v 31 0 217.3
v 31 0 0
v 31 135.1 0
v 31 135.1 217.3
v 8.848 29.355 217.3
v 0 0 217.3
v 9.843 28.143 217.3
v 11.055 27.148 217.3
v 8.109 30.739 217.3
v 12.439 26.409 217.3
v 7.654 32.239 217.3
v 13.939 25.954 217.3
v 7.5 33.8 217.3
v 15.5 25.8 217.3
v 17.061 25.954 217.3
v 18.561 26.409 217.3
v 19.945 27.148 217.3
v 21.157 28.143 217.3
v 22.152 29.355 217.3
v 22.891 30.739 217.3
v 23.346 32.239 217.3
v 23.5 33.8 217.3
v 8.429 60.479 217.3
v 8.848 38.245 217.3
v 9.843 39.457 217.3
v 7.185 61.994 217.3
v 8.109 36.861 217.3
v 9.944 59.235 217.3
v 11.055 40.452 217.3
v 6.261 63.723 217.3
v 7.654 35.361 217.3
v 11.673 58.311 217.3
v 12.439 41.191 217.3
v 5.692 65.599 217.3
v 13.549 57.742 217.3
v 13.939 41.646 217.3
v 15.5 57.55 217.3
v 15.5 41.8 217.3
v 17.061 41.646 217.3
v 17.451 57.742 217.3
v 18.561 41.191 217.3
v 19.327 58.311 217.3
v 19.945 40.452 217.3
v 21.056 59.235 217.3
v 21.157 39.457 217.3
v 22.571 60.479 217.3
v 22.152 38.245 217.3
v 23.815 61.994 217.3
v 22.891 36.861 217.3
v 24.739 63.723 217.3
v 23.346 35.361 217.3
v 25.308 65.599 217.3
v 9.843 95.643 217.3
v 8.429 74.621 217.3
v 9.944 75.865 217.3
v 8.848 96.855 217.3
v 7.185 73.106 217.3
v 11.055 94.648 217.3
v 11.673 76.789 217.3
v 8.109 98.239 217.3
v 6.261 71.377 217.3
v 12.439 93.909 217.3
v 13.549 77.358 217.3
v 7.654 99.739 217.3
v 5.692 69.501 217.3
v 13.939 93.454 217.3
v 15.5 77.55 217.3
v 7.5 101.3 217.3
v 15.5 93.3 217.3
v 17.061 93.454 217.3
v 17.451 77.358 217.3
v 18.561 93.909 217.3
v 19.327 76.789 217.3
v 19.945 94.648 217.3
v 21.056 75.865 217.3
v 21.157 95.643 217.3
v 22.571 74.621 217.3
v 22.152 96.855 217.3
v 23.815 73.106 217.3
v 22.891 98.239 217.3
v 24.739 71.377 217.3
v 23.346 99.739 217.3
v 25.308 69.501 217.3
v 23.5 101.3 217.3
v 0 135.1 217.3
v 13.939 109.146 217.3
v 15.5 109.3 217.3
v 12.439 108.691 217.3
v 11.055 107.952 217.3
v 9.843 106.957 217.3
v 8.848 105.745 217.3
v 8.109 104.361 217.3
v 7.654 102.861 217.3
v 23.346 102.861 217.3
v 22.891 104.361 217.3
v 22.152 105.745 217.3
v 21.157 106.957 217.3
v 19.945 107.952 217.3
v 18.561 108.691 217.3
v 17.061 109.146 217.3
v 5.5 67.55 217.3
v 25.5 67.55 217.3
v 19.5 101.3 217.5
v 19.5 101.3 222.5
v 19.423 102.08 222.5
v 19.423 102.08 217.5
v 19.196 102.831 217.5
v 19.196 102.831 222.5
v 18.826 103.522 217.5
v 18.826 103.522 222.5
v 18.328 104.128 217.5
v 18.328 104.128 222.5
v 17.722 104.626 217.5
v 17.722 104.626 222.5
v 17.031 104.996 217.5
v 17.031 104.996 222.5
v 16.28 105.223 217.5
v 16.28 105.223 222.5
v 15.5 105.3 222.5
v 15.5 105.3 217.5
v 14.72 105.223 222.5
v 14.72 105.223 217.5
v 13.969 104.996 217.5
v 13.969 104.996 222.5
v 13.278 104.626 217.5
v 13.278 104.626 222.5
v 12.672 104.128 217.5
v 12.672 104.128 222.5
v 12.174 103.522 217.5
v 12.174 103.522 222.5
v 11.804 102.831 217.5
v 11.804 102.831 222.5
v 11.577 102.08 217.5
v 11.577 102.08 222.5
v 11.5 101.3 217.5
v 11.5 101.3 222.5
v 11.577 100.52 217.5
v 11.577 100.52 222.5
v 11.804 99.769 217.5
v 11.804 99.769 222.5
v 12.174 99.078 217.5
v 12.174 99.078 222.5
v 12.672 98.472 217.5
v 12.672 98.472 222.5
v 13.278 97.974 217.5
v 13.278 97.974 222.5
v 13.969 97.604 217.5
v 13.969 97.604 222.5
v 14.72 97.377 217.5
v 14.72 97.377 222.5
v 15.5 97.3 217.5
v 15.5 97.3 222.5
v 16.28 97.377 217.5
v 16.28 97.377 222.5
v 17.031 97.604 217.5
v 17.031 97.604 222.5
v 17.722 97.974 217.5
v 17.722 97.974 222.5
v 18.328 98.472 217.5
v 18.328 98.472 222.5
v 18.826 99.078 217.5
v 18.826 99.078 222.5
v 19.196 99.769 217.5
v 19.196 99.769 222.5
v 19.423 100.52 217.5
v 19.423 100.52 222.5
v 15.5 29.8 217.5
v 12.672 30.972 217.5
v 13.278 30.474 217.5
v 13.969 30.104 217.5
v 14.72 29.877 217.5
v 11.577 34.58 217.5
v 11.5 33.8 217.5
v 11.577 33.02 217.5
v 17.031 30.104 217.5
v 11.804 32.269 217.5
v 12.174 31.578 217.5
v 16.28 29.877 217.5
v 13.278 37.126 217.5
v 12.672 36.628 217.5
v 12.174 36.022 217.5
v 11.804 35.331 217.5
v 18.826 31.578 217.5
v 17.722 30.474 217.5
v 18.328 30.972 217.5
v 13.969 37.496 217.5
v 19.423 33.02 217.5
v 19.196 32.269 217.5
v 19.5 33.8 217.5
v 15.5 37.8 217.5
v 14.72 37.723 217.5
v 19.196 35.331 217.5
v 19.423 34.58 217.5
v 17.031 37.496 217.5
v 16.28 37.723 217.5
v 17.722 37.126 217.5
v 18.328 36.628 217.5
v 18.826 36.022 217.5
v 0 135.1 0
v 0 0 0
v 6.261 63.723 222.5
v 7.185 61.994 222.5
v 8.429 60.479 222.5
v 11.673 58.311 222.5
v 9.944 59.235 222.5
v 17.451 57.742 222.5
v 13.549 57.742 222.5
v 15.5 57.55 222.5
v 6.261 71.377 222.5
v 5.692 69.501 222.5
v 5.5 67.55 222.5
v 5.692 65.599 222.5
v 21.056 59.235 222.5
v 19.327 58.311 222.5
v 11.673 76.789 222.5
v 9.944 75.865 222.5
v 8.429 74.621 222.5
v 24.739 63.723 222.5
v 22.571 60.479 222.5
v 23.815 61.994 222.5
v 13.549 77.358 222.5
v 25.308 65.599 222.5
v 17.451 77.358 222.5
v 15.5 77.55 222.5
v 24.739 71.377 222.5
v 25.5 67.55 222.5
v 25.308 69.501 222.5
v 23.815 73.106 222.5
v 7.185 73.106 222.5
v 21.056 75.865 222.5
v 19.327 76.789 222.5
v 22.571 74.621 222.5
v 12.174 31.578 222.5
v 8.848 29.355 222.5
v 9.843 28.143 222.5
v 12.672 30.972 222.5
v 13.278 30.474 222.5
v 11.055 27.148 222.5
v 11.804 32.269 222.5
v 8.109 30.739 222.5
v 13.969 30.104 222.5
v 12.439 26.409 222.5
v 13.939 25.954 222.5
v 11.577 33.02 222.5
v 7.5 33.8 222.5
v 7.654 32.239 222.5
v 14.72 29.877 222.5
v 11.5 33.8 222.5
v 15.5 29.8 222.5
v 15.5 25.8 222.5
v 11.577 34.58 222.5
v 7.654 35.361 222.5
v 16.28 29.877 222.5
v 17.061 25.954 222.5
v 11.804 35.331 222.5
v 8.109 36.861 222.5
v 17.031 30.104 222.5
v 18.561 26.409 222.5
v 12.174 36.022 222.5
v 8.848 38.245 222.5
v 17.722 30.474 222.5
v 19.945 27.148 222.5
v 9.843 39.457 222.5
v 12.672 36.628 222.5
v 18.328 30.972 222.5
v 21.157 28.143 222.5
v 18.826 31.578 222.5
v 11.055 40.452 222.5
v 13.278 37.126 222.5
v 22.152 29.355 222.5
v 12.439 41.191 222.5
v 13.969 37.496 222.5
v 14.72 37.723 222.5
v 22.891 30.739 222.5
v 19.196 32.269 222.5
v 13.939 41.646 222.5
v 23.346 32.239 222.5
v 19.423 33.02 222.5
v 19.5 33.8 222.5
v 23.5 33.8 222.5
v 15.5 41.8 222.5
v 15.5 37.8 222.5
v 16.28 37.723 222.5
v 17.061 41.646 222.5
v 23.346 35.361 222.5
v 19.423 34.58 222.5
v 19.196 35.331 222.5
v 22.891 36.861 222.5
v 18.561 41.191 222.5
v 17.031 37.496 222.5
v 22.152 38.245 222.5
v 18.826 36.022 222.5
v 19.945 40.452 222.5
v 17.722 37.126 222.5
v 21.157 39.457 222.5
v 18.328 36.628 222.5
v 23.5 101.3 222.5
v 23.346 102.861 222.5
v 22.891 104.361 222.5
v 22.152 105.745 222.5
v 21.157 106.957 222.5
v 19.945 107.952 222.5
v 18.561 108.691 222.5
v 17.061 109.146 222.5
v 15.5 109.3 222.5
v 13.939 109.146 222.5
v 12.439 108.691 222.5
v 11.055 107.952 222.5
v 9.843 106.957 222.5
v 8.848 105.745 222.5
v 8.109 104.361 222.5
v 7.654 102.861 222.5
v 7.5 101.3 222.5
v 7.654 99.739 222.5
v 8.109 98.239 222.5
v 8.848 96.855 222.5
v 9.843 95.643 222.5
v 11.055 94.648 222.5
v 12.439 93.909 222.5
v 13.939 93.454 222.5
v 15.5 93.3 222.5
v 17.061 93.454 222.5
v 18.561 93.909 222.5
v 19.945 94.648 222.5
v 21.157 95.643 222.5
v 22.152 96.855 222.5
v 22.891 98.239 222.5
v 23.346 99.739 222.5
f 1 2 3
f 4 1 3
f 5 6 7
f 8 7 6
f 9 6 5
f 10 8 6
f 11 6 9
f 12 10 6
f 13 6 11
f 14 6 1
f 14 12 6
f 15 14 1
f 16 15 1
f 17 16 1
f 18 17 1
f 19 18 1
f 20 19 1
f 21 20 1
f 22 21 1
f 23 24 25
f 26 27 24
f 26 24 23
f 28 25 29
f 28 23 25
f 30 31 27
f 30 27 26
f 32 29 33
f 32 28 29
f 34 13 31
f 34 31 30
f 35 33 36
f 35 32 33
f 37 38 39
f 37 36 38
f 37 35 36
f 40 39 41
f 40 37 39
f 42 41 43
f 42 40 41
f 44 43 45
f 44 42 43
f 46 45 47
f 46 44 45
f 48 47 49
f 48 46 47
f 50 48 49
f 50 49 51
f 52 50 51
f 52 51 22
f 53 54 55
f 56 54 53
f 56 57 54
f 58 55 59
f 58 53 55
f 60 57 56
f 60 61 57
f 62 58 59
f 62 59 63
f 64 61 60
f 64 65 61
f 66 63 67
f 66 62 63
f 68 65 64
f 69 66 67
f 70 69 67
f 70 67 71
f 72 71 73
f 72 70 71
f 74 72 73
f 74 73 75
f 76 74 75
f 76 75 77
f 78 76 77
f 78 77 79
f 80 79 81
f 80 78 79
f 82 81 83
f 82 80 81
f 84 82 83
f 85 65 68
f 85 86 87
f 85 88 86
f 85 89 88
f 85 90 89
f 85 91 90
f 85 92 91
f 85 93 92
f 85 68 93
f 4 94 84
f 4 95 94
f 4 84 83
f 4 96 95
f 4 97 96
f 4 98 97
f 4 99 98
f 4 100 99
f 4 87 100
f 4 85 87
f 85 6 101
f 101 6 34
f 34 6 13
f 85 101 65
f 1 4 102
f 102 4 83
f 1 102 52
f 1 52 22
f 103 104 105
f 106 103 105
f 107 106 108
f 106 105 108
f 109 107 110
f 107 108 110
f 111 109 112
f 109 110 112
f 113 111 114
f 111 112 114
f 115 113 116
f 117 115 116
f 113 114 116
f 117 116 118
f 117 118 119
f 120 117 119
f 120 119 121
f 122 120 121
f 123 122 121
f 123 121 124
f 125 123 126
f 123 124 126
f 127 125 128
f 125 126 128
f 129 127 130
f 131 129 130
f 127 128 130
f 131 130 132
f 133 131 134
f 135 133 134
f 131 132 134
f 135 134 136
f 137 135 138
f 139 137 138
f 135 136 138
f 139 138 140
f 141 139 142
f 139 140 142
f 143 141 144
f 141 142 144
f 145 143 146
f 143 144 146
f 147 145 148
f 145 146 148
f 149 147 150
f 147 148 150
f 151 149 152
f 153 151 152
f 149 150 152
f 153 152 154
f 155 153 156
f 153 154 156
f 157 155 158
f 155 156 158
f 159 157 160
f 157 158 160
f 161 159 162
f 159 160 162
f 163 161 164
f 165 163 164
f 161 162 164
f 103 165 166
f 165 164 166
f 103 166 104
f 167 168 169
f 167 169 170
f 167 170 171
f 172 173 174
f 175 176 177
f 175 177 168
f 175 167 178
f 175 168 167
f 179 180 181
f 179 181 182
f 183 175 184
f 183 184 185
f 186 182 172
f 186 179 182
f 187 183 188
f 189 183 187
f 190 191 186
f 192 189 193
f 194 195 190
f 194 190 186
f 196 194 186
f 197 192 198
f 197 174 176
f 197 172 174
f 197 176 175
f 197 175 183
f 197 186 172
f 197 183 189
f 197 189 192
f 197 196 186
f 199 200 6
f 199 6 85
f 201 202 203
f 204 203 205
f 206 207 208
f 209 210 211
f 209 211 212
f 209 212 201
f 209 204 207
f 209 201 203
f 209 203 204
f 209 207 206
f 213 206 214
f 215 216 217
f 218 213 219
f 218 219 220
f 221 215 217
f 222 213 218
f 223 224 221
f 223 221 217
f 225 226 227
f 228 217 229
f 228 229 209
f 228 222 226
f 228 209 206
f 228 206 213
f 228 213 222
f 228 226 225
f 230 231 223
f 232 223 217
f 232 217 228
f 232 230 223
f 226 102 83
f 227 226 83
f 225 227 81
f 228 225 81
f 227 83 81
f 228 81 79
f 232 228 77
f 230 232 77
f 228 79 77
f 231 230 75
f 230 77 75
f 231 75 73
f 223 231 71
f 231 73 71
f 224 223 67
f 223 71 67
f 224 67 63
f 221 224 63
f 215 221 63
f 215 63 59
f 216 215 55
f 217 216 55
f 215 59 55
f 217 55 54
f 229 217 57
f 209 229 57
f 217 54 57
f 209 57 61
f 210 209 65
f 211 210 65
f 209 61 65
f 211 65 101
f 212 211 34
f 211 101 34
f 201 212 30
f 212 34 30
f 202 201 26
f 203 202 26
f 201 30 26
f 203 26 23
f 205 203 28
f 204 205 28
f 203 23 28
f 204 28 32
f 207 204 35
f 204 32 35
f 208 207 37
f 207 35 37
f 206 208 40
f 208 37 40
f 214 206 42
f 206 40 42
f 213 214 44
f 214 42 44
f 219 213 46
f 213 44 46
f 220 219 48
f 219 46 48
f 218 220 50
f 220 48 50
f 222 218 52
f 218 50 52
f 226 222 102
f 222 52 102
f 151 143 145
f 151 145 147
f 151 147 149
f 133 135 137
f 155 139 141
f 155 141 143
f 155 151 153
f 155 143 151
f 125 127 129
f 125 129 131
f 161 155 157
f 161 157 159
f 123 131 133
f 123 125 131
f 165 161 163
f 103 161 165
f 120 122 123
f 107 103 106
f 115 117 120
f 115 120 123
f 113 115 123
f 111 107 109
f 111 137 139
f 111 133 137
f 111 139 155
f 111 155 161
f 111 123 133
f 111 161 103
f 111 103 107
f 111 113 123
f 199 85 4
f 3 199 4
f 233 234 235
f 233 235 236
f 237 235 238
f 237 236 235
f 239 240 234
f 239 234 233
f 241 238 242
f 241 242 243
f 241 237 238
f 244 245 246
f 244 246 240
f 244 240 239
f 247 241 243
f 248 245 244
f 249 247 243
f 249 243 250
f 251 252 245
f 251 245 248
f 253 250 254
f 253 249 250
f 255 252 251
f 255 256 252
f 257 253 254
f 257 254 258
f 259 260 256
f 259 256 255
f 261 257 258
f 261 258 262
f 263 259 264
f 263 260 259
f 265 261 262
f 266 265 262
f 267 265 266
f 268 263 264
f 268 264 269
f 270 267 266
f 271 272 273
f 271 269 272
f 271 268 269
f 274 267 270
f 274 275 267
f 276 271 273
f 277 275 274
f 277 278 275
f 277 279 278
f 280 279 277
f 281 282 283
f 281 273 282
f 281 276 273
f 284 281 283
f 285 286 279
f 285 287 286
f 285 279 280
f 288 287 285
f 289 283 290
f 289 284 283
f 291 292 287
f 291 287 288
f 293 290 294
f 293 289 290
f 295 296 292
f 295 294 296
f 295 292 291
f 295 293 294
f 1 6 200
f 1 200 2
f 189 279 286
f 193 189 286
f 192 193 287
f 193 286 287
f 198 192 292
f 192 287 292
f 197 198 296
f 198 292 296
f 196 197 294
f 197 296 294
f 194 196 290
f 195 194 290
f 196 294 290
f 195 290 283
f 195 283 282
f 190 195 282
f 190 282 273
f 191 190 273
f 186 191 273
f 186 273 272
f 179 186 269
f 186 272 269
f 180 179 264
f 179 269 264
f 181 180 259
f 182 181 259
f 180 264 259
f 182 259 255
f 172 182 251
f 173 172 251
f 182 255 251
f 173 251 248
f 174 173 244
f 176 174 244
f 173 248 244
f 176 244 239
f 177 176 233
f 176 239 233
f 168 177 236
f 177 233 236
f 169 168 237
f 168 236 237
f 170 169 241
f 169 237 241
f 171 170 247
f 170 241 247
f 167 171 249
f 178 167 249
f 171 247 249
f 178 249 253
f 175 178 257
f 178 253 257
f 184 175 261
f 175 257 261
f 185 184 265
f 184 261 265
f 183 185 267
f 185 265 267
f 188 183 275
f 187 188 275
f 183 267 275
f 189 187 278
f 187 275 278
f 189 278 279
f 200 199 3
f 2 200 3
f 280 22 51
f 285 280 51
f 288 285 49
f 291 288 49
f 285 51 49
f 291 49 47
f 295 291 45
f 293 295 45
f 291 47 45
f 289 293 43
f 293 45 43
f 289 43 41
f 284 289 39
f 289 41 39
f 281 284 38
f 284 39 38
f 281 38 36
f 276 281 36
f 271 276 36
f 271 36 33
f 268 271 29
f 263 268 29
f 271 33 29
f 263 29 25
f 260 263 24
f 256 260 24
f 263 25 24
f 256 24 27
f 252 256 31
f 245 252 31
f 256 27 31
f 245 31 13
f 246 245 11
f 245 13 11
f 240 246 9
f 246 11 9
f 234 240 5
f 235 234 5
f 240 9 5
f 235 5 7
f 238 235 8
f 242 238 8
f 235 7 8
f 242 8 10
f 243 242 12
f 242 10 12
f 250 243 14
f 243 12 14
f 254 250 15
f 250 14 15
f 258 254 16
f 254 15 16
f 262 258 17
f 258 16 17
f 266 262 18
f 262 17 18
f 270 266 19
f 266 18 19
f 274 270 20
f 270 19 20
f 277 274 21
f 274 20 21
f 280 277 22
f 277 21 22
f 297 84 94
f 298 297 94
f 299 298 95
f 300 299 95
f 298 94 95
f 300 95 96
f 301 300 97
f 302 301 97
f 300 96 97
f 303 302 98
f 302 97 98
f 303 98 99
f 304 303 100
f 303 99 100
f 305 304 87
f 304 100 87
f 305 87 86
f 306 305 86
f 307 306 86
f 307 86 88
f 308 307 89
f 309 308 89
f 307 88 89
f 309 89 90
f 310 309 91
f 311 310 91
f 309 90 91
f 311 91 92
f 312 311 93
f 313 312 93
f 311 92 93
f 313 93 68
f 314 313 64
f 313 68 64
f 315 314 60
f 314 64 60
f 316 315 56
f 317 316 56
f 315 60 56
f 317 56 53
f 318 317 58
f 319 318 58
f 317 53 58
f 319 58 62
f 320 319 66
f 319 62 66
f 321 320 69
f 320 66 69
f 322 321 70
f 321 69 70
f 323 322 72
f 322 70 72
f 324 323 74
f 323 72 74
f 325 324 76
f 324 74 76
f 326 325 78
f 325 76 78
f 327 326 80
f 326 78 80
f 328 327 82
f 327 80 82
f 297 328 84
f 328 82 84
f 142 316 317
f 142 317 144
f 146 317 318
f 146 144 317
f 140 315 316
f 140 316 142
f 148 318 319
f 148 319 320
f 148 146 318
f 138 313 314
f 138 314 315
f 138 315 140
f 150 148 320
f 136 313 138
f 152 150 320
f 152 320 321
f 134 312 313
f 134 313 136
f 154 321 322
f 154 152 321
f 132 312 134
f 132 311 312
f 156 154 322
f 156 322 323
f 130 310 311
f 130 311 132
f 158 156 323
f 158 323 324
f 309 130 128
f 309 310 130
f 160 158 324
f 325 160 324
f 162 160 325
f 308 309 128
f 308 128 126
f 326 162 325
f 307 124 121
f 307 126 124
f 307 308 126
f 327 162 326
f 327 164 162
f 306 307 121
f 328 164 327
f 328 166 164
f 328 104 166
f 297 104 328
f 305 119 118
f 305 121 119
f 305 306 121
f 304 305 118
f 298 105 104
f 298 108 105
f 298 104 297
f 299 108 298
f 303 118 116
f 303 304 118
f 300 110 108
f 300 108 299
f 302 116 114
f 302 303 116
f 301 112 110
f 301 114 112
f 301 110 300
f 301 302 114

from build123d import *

# Parameters (mm, degrees)
SKETCH_W      = 31
SKETCH_H      = 135.1
PAD_DEPTH     = 217.3
SKETCH001_R   = 8
SKETCH001_R_2 = 10
PAD001_DEPTH  = 5.2
SKETCH002_R   = 4
POCKET_DEPTH  = 5


with BuildPart() as part:
    # Sketch → Pad (new body)
    with BuildSketch(Plane.XY):
        with Locations((15.5, 67.55)):
            Rectangle(SKETCH_W, SKETCH_H)
    extrude(amount=PAD_DEPTH)

    # Sketch001 (on Face6 of Pad) → Pad001 (join)
    with BuildSketch(Plane.XY.offset(217.3)):
        with Locations((15.5, 33.8)):
            Circle(SKETCH001_R)
        with Locations((15.5, 67.55)):
            Circle(SKETCH001_R_2)
        with Locations((15.5, 101.3)):
            Circle(SKETCH001_R)
    extrude(amount=PAD001_DEPTH)

    # Sketch002 (on Face11 of Pad001) → Pocket (cut)
    with BuildSketch(Plane.XY.offset(222.5)):
        with Locations((15.5, 101.3)):
            Circle(SKETCH002_R)
        with Locations((15.5, 33.8)):
            Circle(SKETCH002_R)
    extrude(amount=-POCKET_DEPTH, mode=Mode.SUBTRACT)


solid = part.part
